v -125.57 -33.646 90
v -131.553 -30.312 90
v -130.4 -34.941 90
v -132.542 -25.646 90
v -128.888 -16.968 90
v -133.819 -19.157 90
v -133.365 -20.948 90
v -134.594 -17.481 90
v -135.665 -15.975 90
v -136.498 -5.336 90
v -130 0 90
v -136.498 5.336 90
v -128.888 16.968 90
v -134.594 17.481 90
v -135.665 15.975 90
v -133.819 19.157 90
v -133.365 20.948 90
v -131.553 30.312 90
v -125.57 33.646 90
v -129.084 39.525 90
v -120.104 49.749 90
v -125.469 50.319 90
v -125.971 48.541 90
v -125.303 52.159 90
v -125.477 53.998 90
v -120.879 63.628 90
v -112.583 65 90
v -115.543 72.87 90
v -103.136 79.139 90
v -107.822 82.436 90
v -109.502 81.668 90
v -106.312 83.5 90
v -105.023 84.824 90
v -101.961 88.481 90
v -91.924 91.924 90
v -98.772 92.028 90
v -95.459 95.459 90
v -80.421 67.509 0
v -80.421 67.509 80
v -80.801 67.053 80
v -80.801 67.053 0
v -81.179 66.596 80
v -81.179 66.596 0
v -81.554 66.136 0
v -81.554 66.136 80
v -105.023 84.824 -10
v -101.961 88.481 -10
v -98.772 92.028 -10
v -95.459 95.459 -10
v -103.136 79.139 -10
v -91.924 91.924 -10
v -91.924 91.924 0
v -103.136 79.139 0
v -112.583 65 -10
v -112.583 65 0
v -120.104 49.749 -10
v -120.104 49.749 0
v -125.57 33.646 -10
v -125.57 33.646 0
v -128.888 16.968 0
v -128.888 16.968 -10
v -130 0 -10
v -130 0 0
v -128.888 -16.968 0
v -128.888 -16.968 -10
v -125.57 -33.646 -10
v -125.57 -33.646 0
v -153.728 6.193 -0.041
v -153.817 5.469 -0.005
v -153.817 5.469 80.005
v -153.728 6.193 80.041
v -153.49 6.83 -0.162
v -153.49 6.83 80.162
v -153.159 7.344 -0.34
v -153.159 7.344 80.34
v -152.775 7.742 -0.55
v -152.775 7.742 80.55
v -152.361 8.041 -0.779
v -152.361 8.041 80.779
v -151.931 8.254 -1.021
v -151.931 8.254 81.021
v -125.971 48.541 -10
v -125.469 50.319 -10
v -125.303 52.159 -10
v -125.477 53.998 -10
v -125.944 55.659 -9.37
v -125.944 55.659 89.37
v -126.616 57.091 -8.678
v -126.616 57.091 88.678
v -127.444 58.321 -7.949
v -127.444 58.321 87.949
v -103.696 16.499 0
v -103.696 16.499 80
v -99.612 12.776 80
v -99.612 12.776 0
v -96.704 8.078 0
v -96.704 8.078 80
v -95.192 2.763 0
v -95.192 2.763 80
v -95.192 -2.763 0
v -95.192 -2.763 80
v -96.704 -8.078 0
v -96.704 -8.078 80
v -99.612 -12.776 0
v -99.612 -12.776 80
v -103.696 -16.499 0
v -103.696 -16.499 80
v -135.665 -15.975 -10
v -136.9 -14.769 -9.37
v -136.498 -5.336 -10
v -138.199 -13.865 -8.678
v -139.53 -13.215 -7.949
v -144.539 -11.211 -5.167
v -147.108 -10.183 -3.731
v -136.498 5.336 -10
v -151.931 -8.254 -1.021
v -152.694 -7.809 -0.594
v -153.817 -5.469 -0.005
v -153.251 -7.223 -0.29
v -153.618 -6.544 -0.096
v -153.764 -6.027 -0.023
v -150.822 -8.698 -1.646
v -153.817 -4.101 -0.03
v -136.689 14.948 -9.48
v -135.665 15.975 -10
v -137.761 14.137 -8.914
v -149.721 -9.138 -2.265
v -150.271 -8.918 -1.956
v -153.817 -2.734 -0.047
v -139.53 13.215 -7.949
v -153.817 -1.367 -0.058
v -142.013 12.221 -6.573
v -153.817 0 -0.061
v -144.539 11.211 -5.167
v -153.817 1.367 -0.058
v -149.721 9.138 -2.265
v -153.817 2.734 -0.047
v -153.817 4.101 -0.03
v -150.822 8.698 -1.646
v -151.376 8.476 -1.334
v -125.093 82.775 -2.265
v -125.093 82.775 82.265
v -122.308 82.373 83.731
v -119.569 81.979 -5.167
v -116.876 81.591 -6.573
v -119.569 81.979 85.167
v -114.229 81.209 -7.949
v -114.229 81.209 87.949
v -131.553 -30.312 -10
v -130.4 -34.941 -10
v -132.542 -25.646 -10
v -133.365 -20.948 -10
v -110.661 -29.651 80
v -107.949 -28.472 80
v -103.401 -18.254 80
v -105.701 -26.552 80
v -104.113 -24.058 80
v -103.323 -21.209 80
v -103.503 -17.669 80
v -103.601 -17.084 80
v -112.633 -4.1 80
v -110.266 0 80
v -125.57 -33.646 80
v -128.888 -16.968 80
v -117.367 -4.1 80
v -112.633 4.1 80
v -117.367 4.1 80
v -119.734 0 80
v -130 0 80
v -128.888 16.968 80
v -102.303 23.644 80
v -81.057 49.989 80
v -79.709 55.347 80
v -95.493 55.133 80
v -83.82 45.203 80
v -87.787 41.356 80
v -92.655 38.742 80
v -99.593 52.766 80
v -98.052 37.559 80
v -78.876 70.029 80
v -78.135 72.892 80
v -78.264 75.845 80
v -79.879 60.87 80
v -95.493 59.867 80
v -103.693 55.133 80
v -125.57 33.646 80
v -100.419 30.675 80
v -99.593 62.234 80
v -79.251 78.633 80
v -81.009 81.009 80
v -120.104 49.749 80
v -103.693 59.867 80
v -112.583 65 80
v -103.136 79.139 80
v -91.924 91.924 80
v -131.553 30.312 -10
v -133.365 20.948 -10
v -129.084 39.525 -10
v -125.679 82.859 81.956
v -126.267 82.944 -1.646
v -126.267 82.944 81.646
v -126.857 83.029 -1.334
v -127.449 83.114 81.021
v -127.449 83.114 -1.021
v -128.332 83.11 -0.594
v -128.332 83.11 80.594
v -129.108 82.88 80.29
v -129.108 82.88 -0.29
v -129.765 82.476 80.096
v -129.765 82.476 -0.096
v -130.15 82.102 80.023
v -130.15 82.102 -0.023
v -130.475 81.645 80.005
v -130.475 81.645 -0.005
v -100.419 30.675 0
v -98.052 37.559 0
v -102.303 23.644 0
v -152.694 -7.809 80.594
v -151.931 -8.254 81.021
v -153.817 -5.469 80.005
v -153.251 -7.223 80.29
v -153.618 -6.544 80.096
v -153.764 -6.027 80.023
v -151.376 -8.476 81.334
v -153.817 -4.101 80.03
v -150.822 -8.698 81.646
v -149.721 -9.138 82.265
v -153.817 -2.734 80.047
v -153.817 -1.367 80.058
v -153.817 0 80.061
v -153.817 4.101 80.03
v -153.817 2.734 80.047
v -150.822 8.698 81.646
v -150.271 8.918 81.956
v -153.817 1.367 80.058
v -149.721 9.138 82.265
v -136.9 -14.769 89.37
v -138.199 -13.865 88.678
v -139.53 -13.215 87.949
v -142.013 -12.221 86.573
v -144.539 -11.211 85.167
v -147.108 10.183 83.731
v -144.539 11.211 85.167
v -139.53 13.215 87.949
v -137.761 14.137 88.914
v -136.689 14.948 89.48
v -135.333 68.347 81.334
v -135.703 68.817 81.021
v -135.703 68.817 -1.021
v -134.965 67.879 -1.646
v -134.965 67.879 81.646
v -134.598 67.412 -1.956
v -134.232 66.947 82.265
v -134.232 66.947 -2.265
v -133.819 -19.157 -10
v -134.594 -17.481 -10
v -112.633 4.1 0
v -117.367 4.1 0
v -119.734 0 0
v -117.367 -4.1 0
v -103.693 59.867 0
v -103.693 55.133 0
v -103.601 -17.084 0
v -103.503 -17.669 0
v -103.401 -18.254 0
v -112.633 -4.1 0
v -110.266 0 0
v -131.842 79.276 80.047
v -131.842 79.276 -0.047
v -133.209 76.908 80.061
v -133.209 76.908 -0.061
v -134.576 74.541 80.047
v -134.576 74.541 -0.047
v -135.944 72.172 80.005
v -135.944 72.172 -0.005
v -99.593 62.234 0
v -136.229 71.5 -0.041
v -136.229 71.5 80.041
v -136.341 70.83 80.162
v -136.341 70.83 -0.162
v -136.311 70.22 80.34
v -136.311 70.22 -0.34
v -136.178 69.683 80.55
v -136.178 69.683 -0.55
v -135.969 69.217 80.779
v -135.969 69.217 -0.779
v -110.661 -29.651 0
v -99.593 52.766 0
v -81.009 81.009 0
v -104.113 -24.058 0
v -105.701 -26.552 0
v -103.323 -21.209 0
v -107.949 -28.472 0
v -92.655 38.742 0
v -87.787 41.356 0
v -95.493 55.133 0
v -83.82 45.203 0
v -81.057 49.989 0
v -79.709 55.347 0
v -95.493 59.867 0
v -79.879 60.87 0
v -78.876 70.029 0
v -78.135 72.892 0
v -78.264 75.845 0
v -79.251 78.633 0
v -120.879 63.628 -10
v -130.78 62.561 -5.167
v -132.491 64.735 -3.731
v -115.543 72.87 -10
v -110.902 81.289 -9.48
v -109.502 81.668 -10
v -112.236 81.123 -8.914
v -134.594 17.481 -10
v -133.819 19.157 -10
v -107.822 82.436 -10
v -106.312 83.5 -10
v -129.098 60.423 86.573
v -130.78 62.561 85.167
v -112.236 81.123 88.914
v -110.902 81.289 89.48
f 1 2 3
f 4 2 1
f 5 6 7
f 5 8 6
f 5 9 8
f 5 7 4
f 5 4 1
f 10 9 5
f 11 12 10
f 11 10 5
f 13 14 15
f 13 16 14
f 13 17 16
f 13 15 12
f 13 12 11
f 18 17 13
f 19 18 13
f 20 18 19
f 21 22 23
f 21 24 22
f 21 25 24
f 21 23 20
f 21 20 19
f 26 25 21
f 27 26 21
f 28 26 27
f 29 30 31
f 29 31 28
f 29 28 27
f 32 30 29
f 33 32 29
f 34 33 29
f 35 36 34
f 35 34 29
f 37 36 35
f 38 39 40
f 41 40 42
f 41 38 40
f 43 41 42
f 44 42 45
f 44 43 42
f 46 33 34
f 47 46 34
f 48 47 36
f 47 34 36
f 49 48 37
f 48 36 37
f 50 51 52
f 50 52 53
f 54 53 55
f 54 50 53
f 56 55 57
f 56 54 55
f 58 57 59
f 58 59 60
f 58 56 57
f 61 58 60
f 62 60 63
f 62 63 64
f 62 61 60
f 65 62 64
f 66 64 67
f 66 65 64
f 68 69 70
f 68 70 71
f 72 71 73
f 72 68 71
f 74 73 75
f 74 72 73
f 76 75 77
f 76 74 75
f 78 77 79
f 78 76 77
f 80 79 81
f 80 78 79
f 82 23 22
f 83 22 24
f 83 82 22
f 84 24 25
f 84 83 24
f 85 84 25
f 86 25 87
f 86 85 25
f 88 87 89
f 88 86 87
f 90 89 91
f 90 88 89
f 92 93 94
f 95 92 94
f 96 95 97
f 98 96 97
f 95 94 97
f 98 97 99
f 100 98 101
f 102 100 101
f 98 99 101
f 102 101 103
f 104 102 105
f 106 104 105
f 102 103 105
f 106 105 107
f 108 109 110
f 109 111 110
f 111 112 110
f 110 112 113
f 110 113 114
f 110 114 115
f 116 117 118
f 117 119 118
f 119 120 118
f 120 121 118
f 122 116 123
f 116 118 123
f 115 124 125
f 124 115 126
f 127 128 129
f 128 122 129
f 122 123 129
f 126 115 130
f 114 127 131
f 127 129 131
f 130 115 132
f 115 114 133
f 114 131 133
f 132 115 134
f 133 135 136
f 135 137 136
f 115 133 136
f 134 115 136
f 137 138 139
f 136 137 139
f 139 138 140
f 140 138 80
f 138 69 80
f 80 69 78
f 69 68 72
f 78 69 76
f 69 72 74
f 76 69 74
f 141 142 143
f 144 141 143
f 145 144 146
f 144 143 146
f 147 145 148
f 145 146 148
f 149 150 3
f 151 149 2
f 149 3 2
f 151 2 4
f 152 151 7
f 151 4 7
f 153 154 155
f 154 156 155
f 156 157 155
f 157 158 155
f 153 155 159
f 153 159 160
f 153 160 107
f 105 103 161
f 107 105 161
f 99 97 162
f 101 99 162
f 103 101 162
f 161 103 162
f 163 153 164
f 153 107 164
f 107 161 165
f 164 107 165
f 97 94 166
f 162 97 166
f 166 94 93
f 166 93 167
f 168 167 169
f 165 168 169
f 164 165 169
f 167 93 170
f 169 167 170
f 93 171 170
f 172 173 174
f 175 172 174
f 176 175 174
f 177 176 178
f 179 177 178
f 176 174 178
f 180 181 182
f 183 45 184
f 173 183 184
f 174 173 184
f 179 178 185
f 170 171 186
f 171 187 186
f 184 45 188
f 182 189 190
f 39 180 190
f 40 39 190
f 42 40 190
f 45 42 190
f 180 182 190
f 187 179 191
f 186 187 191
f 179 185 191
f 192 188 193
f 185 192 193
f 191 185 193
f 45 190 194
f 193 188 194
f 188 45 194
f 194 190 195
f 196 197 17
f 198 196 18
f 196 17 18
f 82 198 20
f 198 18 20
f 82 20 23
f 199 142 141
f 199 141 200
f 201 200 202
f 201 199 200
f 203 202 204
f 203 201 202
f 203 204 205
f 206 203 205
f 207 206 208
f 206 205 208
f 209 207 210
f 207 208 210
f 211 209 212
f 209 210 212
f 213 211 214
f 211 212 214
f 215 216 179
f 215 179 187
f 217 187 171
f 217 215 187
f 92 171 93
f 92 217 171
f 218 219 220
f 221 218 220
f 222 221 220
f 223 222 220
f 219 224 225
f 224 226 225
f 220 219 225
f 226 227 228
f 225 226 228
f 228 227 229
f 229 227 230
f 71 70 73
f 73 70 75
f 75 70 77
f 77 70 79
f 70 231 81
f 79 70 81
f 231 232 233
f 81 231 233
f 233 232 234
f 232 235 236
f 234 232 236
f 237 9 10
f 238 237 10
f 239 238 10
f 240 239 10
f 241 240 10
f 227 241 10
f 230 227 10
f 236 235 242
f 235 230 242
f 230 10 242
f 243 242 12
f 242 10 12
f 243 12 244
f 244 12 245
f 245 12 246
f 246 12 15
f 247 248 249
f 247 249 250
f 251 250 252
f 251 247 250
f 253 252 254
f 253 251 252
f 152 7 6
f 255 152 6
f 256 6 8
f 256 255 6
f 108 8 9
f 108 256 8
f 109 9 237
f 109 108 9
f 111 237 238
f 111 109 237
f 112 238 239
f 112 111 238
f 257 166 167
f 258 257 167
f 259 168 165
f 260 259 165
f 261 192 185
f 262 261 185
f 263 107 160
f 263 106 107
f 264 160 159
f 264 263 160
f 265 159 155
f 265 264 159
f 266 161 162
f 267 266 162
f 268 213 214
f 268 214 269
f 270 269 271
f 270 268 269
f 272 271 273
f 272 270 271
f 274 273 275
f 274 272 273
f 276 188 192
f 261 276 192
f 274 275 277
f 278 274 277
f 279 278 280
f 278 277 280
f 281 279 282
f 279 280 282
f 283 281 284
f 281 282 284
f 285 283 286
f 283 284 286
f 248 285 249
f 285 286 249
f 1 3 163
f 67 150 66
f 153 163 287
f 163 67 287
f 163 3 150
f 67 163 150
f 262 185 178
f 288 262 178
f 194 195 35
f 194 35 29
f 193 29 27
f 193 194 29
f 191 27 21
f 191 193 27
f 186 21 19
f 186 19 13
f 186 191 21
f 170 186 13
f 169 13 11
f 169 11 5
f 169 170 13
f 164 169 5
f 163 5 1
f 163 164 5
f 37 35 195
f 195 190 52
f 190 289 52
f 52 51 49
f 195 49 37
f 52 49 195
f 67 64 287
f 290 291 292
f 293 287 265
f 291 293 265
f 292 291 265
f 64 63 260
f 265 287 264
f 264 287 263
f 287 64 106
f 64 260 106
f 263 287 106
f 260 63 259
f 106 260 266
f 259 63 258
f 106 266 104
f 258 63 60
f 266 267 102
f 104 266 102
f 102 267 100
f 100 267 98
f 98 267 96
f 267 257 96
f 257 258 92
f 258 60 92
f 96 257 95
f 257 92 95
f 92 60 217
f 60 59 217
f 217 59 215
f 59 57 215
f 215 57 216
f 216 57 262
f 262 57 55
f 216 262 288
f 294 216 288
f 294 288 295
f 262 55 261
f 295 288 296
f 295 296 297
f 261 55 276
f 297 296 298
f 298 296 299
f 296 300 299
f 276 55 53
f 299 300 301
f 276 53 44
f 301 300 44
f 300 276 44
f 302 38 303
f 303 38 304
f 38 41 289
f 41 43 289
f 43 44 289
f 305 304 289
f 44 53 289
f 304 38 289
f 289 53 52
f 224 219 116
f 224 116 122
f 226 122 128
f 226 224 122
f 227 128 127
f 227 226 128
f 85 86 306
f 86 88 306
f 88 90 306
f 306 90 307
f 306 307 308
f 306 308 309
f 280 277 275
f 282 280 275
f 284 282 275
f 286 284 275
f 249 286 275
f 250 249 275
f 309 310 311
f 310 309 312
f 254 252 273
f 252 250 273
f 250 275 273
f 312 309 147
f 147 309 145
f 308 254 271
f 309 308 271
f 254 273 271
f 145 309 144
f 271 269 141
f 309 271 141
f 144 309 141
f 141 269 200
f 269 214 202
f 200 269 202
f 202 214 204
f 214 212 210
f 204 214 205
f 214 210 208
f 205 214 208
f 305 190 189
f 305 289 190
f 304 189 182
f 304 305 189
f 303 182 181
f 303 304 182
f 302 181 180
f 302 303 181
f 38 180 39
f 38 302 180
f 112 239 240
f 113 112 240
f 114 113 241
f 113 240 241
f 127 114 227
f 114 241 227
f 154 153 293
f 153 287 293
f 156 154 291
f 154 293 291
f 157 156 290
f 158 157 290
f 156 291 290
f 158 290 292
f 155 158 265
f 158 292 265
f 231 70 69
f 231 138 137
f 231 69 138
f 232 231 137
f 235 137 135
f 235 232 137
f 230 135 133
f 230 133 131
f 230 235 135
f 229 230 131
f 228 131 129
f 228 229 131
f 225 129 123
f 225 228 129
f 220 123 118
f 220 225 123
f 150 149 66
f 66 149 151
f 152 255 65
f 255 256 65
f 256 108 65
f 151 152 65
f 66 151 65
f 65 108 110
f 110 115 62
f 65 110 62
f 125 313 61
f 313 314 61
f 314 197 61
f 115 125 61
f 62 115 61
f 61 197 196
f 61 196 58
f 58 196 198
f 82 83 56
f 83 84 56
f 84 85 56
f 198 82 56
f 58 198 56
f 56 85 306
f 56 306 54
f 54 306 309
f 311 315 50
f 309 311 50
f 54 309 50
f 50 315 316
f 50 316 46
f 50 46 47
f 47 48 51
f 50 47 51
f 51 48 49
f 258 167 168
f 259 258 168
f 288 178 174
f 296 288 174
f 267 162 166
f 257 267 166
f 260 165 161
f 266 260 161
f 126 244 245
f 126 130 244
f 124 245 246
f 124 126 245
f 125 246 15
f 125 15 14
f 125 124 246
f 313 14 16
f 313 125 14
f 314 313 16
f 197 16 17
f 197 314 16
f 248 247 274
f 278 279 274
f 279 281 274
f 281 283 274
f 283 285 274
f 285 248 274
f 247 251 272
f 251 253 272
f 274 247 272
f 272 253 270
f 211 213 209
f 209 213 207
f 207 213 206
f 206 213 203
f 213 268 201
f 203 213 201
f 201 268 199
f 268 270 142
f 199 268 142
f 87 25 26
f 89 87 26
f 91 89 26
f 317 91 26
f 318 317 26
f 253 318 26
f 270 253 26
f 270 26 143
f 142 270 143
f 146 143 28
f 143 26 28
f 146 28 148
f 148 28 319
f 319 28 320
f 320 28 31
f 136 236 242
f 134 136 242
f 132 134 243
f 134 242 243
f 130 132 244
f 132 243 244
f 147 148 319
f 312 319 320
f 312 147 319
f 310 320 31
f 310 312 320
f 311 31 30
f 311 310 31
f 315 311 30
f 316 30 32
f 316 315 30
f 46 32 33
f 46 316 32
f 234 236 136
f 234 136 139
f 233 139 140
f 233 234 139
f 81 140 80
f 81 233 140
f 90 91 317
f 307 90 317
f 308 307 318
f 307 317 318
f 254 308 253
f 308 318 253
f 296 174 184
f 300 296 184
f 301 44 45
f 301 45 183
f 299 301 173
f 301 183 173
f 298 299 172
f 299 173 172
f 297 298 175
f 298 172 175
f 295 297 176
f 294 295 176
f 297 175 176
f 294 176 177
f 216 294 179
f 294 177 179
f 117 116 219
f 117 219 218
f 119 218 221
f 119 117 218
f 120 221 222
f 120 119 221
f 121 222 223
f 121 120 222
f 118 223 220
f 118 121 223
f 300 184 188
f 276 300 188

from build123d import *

# Parameters (mm, degrees)
SKETCH_1_R               = 130
SKETCH_1_R_2             = 105
EXTRUDE_1_DEPTH          = 80
CUT_EXTRUDE_1_DEPTH      = 201.499376558
EXTRUDE_2_DEPTH          = 10
EXTRUDE_2_DEPTH_BACK     = 90
SKETCH_5_R               = 150
SKETCH_5_R_2             = 130
EXTRUDE_3_DEPTH          = 80
EXTRUDE_4_DEPTH          = 100
CUT_EXTRUDE_4_DEPTH      = 240.414228959
FILLET_2_R               = 10
FILLET_3_R               = 3
CUT_EXTRUDE_5_DEPTH      = 236.41277176
CUT_EXTRUDE_5_DEPTH_BACK = 236.41277176
FILLET_4_R               = 10


with BuildPart() as part:
    # 草图1 → 凸台-拉伸1 (new body)
    with BuildSketch(Plane.XY):
        Circle(SKETCH_1_R)
        Circle(SKETCH_1_R_2, mode=Mode.SUBTRACT)
    extrude(amount=EXTRUDE_1_DEPTH)

    # 草图2 → 切除-拉伸1 (cut, through all)
    with BuildSketch(Plane.XY.offset(80)):
        Polygon((62.234272207, 99.592921435), (59.867136104, 103.692921435), (55.132863896, 103.692921435), (52.765727793, 99.592921435), (55.132863896, 95.492921435), (59.867136104, 95.492921435), align=None)
        Polygon((4.1, 117.367136104), (0, 119.734272207), (-4.1, 117.367136104), (-4.1, 112.632863896), (0, 110.265727793), (4.1, 112.632863896), align=None)
        Polygon((103.692921435, 55.132863896), (103.692921435, 59.867136104), (99.592921435, 62.234272207), (95.492921435, 59.867136104), (95.492921435, 55.132863896), (99.592921435, 52.765727793), align=None)
        Polygon((117.367136104, -4.1), (119.734272207, 0), (117.367136104, 4.1), (112.632863896, 4.1), (110.265727793, 0), (112.632863896, -4.1), align=None)
        Polygon((99.592921435, -62.234272207), (103.692921435, -59.867136104), (103.692921435, -55.132863896), (99.592921435, -52.765727793), (95.492921435, -55.132863896), (95.492921435, -59.867136104), align=None)
        Polygon((55.132863896, -103.692921435), (59.867136104, -103.692921435), (62.234272207, -99.592921435), (59.867136104, -95.492921435), (55.132863896, -95.492921435), (52.765727793, -99.592921435), align=None)
        Polygon((-4.1, -117.367136104), (0, -119.734272207), (4.1, -117.367136104), (4.1, -112.632863896), (0, -110.265727793), (-4.1, -112.632863896), align=None)
        Polygon((-62.234272207, -99.592921435), (-59.867136104, -103.692921435), (-55.132863896, -103.692921435), (-52.765727793, -99.592921435), (-55.132863896, -95.492921435), (-59.867136104, -95.492921435), align=None)
        Polygon((-103.692921435, -55.132863896), (-103.692921435, -59.867136104), (-99.592921435, -62.234272207), (-95.492921435, -59.867136104), (-95.492921435, -55.132863896), (-99.592921435, -52.765727793), align=None)
        Polygon((-117.367136104, 4.1), (-119.734272207, 0), (-117.367136104, -4.1), (-112.632863896, -4.1), (-110.265727793, 0), (-112.632863896, 4.1), align=None)
        Polygon((-99.592921435, 62.234272207), (-103.692921435, 59.867136104), (-103.692921435, 55.132863896), (-99.592921435, 52.765727793), (-95.492921435, 55.132863896), (-95.492921435, 59.867136104), align=None)
        Polygon((-55.132863896, 103.692921435), (-59.867136104, 103.692921435), (-62.234272207, 99.592921435), (-59.867136104, 95.492921435), (-55.132863896, 95.492921435), (-52.765727793, 99.592921435), align=None)
    extrude(amount=-CUT_EXTRUDE_1_DEPTH, mode=Mode.SUBTRACT)

    # 草图5 → 凸台-拉伸2 (add, two sides: drawn at the far end of the back side and taken through both)
    with BuildSketch(Plane.XY.offset(80).offset(-EXTRUDE_2_DEPTH_BACK)):
        Circle(SKETCH_5_R)
        Circle(SKETCH_5_R_2, mode=Mode.SUBTRACT)
    extrude(amount=EXTRUDE_2_DEPTH + EXTRUDE_2_DEPTH_BACK)

    # 草图7 → 凸台-拉伸3 (add)
    with BuildSketch(Plane.XY.offset(80)):
        with BuildLine():
            Line((-20, 115), (-7.5, 115))
            ThreePointArc((-7.5, 115), (0, 107.5), (7.5, 115))
            Line((7.5, 115), (20, 115))
            ThreePointArc((20, 115), (0, 95), (-20, 115))
        make_face()
        with BuildLine():
            Line((40.179491924, 109.592921435), (51.004809472, 103.342921435))
            ThreePointArc((51.004809472, 103.342921435), (53.75, 93.097730907), (63.995190528, 95.842921435))
            Line((63.995190528, 95.842921435), (74.820508076, 89.592921435))
            ThreePointArc((74.820508076, 89.592921435), (47.5, 82.27241336), (40.179491924, 109.592921435))
        make_face()
        with BuildLine():
            Line((89.592921435, 74.820508076), (95.842921435, 63.995190528))
            ThreePointArc((95.842921435, 63.995190528), (93.097730907, 53.75), (103.342921435, 51.004809472))
            Line((103.342921435, 51.004809472), (109.592921435, 40.179491924))
            ThreePointArc((109.592921435, 40.179491924), (82.27241336, 47.5), (89.592921435, 74.820508076))
        make_face()
        with BuildLine():
            Line((115, 20), (115, 7.5))
            ThreePointArc((115, 7.5), (107.5, 0), (115, -7.5))
            Line((115, -7.5), (115, -20))
            ThreePointArc((115, -20), (95, 0), (115, 20))
        make_face()
        with BuildLine():
            Line((109.592921435, -40.179491924), (103.342921435, -51.004809472))
            ThreePointArc((103.342921435, -51.004809472), (93.097730907, -53.75), (95.842921435, -63.995190528))
            Line((95.842921435, -63.995190528), (89.592921435, -74.820508076))
            ThreePointArc((89.592921435, -74.820508076), (82.27241336, -47.5), (109.592921435, -40.179491924))
        make_face()
        with BuildLine():
            Line((74.820508076, -89.592921435), (63.995190528, -95.842921435))
            ThreePointArc((63.995190528, -95.842921435), (53.75, -93.097730907), (51.004809472, -103.342921435))
            Line((51.004809472, -103.342921435), (40.179491924, -109.592921435))
            ThreePointArc((40.179491924, -109.592921435), (47.5, -82.27241336), (74.820508076, -89.592921435))
        make_face()
        with BuildLine():
            Line((20, -115), (7.5, -115))
            ThreePointArc((7.5, -115), (0, -107.5), (-7.5, -115))
            Line((-7.5, -115), (-20, -115))
            ThreePointArc((-20, -115), (0, -95), (20, -115))
        make_face()
        with BuildLine():
            Line((-40.179491924, -109.592921435), (-51.004809472, -103.342921435))
            ThreePointArc((-51.004809472, -103.342921435), (-53.75, -93.097730907), (-63.995190528, -95.842921435))
            Line((-63.995190528, -95.842921435), (-74.820508076, -89.592921435))
            ThreePointArc((-74.820508076, -89.592921435), (-47.5, -82.27241336), (-40.179491924, -109.592921435))
        make_face()
        with BuildLine():
            Line((-89.592921435, -74.820508076), (-95.842921435, -63.995190528))
            ThreePointArc((-95.842921435, -63.995190528), (-93.097730907, -53.75), (-103.342921435, -51.004809472))
            Line((-103.342921435, -51.004809472), (-109.592921435, -40.179491924))
            ThreePointArc((-109.592921435, -40.179491924), (-82.27241336, -47.5), (-89.592921435, -74.820508076))
        make_face()
        with BuildLine():
            Line((-115, -20), (-115, -7.5))
            ThreePointArc((-115, -7.5), (-107.5, 0), (-115, 7.5))
            Line((-115, 7.5), (-115, 20))
            ThreePointArc((-115, 20), (-95, 0), (-115, -20))
        make_face()
        with BuildLine():
            Line((-109.592921435, 40.179491924), (-103.342921435, 51.004809472))
            ThreePointArc((-103.342921435, 51.004809472), (-93.097730907, 53.75), (-95.842921435, 63.995190528))
            Line((-95.842921435, 63.995190528), (-89.592921435, 74.820508076))
            ThreePointArc((-89.592921435, 74.820508076), (-82.27241336, 47.5), (-109.592921435, 40.179491924))
        make_face()
        with BuildLine():
            Line((-74.820508076, 89.592921435), (-63.995190528, 95.842921435))
            ThreePointArc((-63.995190528, 95.842921435), (-53.75, 93.097730907), (-51.004809472, 103.342921435))
            Line((-51.004809472, 103.342921435), (-40.179491924, 109.592921435))
            ThreePointArc((-40.179491924, 109.592921435), (-47.5, 82.27241336), (-74.820508076, 89.592921435))
        make_face()
    extrude(amount=-EXTRUDE_3_DEPTH)

    # 草图8 → 凸台-拉伸4 (add, through all)
    with BuildSketch(Plane.XY.offset(90)):
        with BuildLine():
            Line((-7.5, 153.81673028), (-9.138136324, 149.721389469))
            ThreePointArc((-9.138136324, 149.721389469), (0, 150), (9.138136324, 149.721389469))
            Line((9.138136324, 149.721389469), (7.5, 153.81673028))
            Line((7.5, 153.81673028), (-7.5, 153.81673028))
        make_face()
        with BuildLine():
            ThreePointArc((-82.774552935, 125.093458608), (-75, 129.903810568), (-66.946836534, 134.231594932))
            Line((-66.946836534, 134.231594932), (-70.413174612, 136.959195949))
            Line((-70.413174612, 136.959195949), (-83.403555668, 129.459195949))
            Line((-83.403555668, 129.459195949), (-82.774552935, 125.093458608))
        make_face()
        with BuildLine():
            Line((70.413174612, 136.959195949), (66.946836534, 134.231594932))
            ThreePointArc((66.946836534, 134.231594932), (75, 129.903810568), (82.774552935, 125.093458608))
            Line((82.774552935, 125.093458608), (83.403555668, 129.459195949))
            Line((83.403555668, 129.459195949), (70.413174612, 136.959195949))
        make_face()
        with BuildLine():
            ThreePointArc((-134.231594932, 66.946836534), (-129.903810568, 75), (-125.093458608, 82.774552935))
            Line((-125.093458608, 82.774552935), (-129.459195949, 83.403555668))
            Line((-129.459195949, 83.403555668), (-136.959195949, 70.413174612))
            Line((-136.959195949, 70.413174612), (-134.231594932, 66.946836534))
        make_face()
        with BuildLine():
            Line((129.459195949, 83.403555668), (125.093458608, 82.774552935))
            ThreePointArc((125.093458608, 82.774552935), (129.903810568, 75), (134.231594932, 66.946836534))
            Line((134.231594932, 66.946836534), (136.959195949, 70.413174612))
            Line((136.959195949, 70.413174612), (129.459195949, 83.403555668))
        make_face()
        with BuildLine():
            ThreePointArc((-149.721389469, -9.138136324), (-150, 0), (-149.721389469, 9.138136324))
            Line((-149.721389469, 9.138136324), (-153.81673028, 7.5))
            Line((-153.81673028, 7.5), (-153.81673028, -7.5))
            Line((-153.81673028, -7.5), (-149.721389469, -9.138136324))
        make_face()
        with BuildLine():
            Line((153.81673028, 7.5), (149.721389469, 9.138136324))
            ThreePointArc((149.721389469, 9.138136324), (150, 0), (149.721389469, -9.138136324))
            Line((149.721389469, -9.138136324), (153.81673028, -7.5))
            Line((153.81673028, -7.5), (153.81673028, 7.5))
        make_face()
        with BuildLine():
            ThreePointArc((-125.093458608, -82.774552935), (-129.903810568, -75), (-134.231594932, -66.946836534))
            Line((-134.231594932, -66.946836534), (-136.959195949, -70.413174612))
            Line((-136.959195949, -70.413174612), (-129.459195949, -83.403555668))
            Line((-129.459195949, -83.403555668), (-125.093458608, -82.774552935))
        make_face()
        with BuildLine():
            ThreePointArc((-66.946836534, -134.231594932), (-75, -129.903810568), (-82.774552935, -125.093458608))
            Line((-82.774552935, -125.093458608), (-83.403555668, -129.459195949))
            Line((-83.403555668, -129.459195949), (-70.413174612, -136.959195949))
            Line((-70.413174612, -136.959195949), (-66.946836534, -134.231594932))
        make_face()
        with BuildLine():
            Line((136.959195949, -70.413174612), (134.231594932, -66.946836534))
            ThreePointArc((134.231594932, -66.946836534), (129.903810568, -75), (125.093458608, -82.774552935))
            Line((125.093458608, -82.774552935), (129.459195949, -83.403555668))
            Line((129.459195949, -83.403555668), (136.959195949, -70.413174612))
        make_face()
        with BuildLine():
            ThreePointArc((9.138136324, -149.721389469), (0, -150), (-9.138136324, -149.721389469))
            Line((-9.138136324, -149.721389469), (-7.5, -153.81673028))
            Line((-7.5, -153.81673028), (7.5, -153.81673028))
            Line((7.5, -153.81673028), (9.138136324, -149.721389469))
        make_face()
        with BuildLine():
            Line((83.403555668, -129.459195949), (82.774552935, -125.093458608))
            ThreePointArc((82.774552935, -125.093458608), (75, -129.903810568), (66.946836534, -134.231594932))
            Line((66.946836534, -134.231594932), (70.413174612, -136.959195949))
            Line((70.413174612, -136.959195949), (83.403555668, -129.459195949))
        make_face()
    extrude(amount=-EXTRUDE_4_DEPTH)

    # 草图10 → 切除-拉伸4 (cut, through all)
    with BuildSketch(Plane.XY.offset(90)):
        with BuildLine():
            Line((-9.138136324, 149.721389469), (-15.378189759, 134.121255883))
            ThreePointArc((-15.378189759, 134.121255883), (-34.940571089, 130.399986549), (-53.742724947, 123.841509662))
            Line((-53.742724947, 123.841509662), (-66.946836534, 134.231594932))
            ThreePointArc((-66.946836534, 134.231594932), (-38.822856765, 144.888873943), (-9.138136324, 149.721389469))
        make_face()
        with BuildLine():
            Line((9.138136324, 149.721389469), (15.378189759, 134.121255883))
            ThreePointArc((15.378189759, 134.121255883), (34.940571089, 130.399986549), (53.742724947, 123.841509662))
            Line((53.742724947, 123.841509662), (66.946836534, 134.231594932))
            ThreePointArc((66.946836534, 134.231594932), (38.822856765, 144.888873943), (9.138136324, 149.721389469))
        make_face()
        with BuildLine():
            Line((82.774552935, 125.093458608), (80.378530937, 108.463319903))
            ThreePointArc((80.378530937, 108.463319903), (95.45941546, 95.45941546), (108.463319903, 80.378530937))
            Line((108.463319903, 80.378530937), (125.093458608, 82.774552935))
            ThreePointArc((125.093458608, 82.774552935), (106.066017178, 106.066017178), (82.774552935, 125.093458608))
        make_face()
        with BuildLine():
            Line((134.231594932, 66.946836534), (123.841509662, 53.742724947))
            ThreePointArc((123.841509662, 53.742724947), (130.399986549, 34.940571089), (134.121255883, 15.378189759))
            Line((134.121255883, 15.378189759), (149.721389469, 9.138136324))
            ThreePointArc((149.721389469, 9.138136324), (144.888873943, 38.822856765), (134.231594932, 66.946836534))
        make_face()
        with BuildLine():
            Line((149.721389469, -9.138136324), (134.121255883, -15.378189759))
            ThreePointArc((134.121255883, -15.378189759), (130.399986549, -34.940571089), (123.841509662, -53.742724947))
            Line((123.841509662, -53.742724947), (134.231594932, -66.946836534))
            ThreePointArc((134.231594932, -66.946836534), (144.888873943, -38.822856765), (149.721389469, -9.138136324))
        make_face()
        with BuildLine():
            Line((125.093458608, -82.774552935), (108.463319903, -80.378530937))
            ThreePointArc((108.463319903, -80.378530937), (95.45941546, -95.45941546), (80.378530937, -108.463319903))
            Line((80.378530937, -108.463319903), (82.774552935, -125.093458608))
            ThreePointArc((82.774552935, -125.093458608), (106.066017178, -106.066017178), (125.093458608, -82.774552935))
        make_face()
        with BuildLine():
            Line((66.946836534, -134.231594932), (53.742724947, -123.841509662))
            ThreePointArc((53.742724947, -123.841509662), (34.940571089, -130.399986549), (15.378189759, -134.121255883))
            Line((15.378189759, -134.121255883), (9.138136324, -149.721389469))
            ThreePointArc((9.138136324, -149.721389469), (38.822856765, -144.888873943), (66.946836534, -134.231594932))
        make_face()
        with BuildLine():
            Line((-9.138136324, -149.721389469), (-15.378189759, -134.121255883))
            ThreePointArc((-15.378189759, -134.121255883), (-34.940571089, -130.399986549), (-53.742724947, -123.841509662))
            Line((-53.742724947, -123.841509662), (-66.946836534, -134.231594932))
            ThreePointArc((-66.946836534, -134.231594932), (-38.822856765, -144.888873943), (-9.138136324, -149.721389469))
        make_face()
        with BuildLine():
            Line((-82.774552935, -125.093458608), (-80.378530937, -108.463319903))
            ThreePointArc((-80.378530937, -108.463319903), (-95.45941546, -95.45941546), (-108.463319903, -80.378530937))
            Line((-108.463319903, -80.378530937), (-125.093458608, -82.774552935))
            ThreePointArc((-125.093458608, -82.774552935), (-106.066017178, -106.066017178), (-82.774552935, -125.093458608))
        make_face()
        with BuildLine():
            Line((-134.231594932, -66.946836534), (-123.841509662, -53.742724947))
            ThreePointArc((-123.841509662, -53.742724947), (-130.399986549, -34.940571089), (-134.121255883, -15.378189759))
            Line((-134.121255883, -15.378189759), (-149.721389469, -9.138136324))
            ThreePointArc((-149.721389469, -9.138136324), (-144.888873943, -38.822856765), (-134.231594932, -66.946836534))
        make_face()
        with BuildLine():
            Line((-149.721389469, 9.138136324), (-134.121255883, 15.378189759))
            ThreePointArc((-134.121255883, 15.378189759), (-130.399986549, 34.940571089), (-123.841509662, 53.742724947))
            Line((-123.841509662, 53.742724947), (-134.231594932, 66.946836534))
            ThreePointArc((-134.231594932, 66.946836534), (-144.888873943, 38.822856765), (-149.721389469, 9.138136324))
        make_face()
        with BuildLine():
            Line((-125.093458608, 82.774552935), (-108.463319903, 80.378530937))
            ThreePointArc((-108.463319903, 80.378530937), (-95.45941546, 95.45941546), (-80.378530937, 108.463319903))
            Line((-80.378530937, 108.463319903), (-82.774552935, 125.093458608))
            ThreePointArc((-82.774552935, 125.093458608), (-106.066017178, 106.066017178), (-125.093458608, 82.774552935))
        make_face()
    extrude(amount=-CUT_EXTRUDE_4_DEPTH, mode=Mode.SUBTRACT)

    # 圆角2
    fillet_2_edges = [part.edges().sort_by_distance(p)[0] for p in [
        (-80.378530937, 108.463319903, 40),
        (-108.463319903, 80.378530937, 40),
        (53.742724947, 123.841509662, 40),
        (15.378189759, 134.121255883, 40),
        (-123.841509662, 53.742724947, 40),
        (-134.121255883, 15.378189759, 40),
        (108.463319903, 80.378530937, 40),
        (80.378530937, 108.463319903, 40),
        (-53.742724947, -123.841509662, 40),
        (-15.378189759, -134.121255883, 40),
        (-108.463319903, -80.378530937, 40),
        (-80.378530937, -108.463319903, 40),
        (-134.121255883, -15.378189759, 40),
        (-123.841509662, -53.742724947, 40),
        (-15.378189759, 134.121255883, 40),
        (-53.742724947, 123.841509662, 40),
        (15.378189759, -134.121255883, 40),
        (53.742724947, -123.841509662, 40),
        (80.378530937, -108.463319903, 40),
        (108.463319903, -80.378530937, 40),
        (123.841509662, -53.742724947, 40),
        (134.121255883, -15.378189759, 40),
        (134.121255883, 15.378189759, 40),
        (123.841509662, 53.742724947, 40),
    ]]
    fillet(fillet_2_edges, radius=FILLET_2_R)

    # 圆角3
    fillet_3_edges = [part.edges().sort_by_distance(p)[0] for p in [
        (-153.81673028, -7.5, 40),
        (-153.81673028, 7.5, 40),
        (-136.959195949, 70.413174612, 40),
        (-129.459195949, 83.403555668, 40),
        (-83.403555668, 129.459195949, 40),
        (-70.413174612, 136.959195949, 40),
        (-7.5, 153.81673028, 40),
        (7.5, 153.81673028, 40),
        (70.413174612, 136.959195949, 40),
        (83.403555668, 129.459195949, 40),
        (129.459195949, 83.403555668, 40),
        (136.959195949, 70.413174612, 40),
        (153.81673028, 7.5, 40),
        (153.81673028, -7.5, 40),
        (136.959195949, -70.413174612, 40),
        (129.459195949, -83.403555668, 40),
        (83.403555668, -129.459195949, 40),
        (70.413174612, -136.959195949, 40),
        (7.5, -153.81673028, 40),
        (-7.5, -153.81673028, 40),
        (-70.413174612, -136.959195949, 40),
        (-83.403555668, -129.459195949, 40),
        (-129.459195949, -83.403555668, 40),
        (-136.959195949, -70.413174612, 40),
    ]]
    fillet(fillet_3_edges, radius=FILLET_3_R)

    # 草图11 → 切除-旋转4 (revolve, cut)
    with BuildSketch(Plane(origin=(0, 0, 0), x_dir=(1, 0, 0), z_dir=(0, 1, 0))):
        Polygon((-50, 60), (-160, -3.508529611), (-160, 60), align=None)
        Polygon((-160, -140), (-160, -76.491470389), (-50, -140), align=None)
    revolve(axis=Axis((0, 0, 0), (0, 0, -1)), mode=Mode.SUBTRACT)

    # 草图12 → 切除-拉伸5 (cut, two sides: drawn at the far end of the back side and taken through both)
    with BuildSketch(Plane.XY.offset(80).offset(-CUT_EXTRUDE_5_DEPTH_BACK)):
        with BuildLine():
            Line((0, 0), (-141.421356237, 141.421356237))
            ThreePointArc((-141.421356237, 141.421356237), (193.185165258, -51.763809021), (-193.185165258, -51.763809021))
            Line((-193.185165258, -51.763809021), (0, 0))
        make_face()
    extrude(amount=CUT_EXTRUDE_5_DEPTH + CUT_EXTRUDE_5_DEPTH_BACK, mode=Mode.SUBTRACT)

    # 圆角4
    fillet_4_edges = [part.edges().sort_by_distance(p)[0] for p in [
        (-74.246212025, 74.246212025, 40),
        (-101.42221176, -27.175999736, 40),
    ]]
    fillet(fillet_4_edges, radius=FILLET_4_R)


solid = part.part
